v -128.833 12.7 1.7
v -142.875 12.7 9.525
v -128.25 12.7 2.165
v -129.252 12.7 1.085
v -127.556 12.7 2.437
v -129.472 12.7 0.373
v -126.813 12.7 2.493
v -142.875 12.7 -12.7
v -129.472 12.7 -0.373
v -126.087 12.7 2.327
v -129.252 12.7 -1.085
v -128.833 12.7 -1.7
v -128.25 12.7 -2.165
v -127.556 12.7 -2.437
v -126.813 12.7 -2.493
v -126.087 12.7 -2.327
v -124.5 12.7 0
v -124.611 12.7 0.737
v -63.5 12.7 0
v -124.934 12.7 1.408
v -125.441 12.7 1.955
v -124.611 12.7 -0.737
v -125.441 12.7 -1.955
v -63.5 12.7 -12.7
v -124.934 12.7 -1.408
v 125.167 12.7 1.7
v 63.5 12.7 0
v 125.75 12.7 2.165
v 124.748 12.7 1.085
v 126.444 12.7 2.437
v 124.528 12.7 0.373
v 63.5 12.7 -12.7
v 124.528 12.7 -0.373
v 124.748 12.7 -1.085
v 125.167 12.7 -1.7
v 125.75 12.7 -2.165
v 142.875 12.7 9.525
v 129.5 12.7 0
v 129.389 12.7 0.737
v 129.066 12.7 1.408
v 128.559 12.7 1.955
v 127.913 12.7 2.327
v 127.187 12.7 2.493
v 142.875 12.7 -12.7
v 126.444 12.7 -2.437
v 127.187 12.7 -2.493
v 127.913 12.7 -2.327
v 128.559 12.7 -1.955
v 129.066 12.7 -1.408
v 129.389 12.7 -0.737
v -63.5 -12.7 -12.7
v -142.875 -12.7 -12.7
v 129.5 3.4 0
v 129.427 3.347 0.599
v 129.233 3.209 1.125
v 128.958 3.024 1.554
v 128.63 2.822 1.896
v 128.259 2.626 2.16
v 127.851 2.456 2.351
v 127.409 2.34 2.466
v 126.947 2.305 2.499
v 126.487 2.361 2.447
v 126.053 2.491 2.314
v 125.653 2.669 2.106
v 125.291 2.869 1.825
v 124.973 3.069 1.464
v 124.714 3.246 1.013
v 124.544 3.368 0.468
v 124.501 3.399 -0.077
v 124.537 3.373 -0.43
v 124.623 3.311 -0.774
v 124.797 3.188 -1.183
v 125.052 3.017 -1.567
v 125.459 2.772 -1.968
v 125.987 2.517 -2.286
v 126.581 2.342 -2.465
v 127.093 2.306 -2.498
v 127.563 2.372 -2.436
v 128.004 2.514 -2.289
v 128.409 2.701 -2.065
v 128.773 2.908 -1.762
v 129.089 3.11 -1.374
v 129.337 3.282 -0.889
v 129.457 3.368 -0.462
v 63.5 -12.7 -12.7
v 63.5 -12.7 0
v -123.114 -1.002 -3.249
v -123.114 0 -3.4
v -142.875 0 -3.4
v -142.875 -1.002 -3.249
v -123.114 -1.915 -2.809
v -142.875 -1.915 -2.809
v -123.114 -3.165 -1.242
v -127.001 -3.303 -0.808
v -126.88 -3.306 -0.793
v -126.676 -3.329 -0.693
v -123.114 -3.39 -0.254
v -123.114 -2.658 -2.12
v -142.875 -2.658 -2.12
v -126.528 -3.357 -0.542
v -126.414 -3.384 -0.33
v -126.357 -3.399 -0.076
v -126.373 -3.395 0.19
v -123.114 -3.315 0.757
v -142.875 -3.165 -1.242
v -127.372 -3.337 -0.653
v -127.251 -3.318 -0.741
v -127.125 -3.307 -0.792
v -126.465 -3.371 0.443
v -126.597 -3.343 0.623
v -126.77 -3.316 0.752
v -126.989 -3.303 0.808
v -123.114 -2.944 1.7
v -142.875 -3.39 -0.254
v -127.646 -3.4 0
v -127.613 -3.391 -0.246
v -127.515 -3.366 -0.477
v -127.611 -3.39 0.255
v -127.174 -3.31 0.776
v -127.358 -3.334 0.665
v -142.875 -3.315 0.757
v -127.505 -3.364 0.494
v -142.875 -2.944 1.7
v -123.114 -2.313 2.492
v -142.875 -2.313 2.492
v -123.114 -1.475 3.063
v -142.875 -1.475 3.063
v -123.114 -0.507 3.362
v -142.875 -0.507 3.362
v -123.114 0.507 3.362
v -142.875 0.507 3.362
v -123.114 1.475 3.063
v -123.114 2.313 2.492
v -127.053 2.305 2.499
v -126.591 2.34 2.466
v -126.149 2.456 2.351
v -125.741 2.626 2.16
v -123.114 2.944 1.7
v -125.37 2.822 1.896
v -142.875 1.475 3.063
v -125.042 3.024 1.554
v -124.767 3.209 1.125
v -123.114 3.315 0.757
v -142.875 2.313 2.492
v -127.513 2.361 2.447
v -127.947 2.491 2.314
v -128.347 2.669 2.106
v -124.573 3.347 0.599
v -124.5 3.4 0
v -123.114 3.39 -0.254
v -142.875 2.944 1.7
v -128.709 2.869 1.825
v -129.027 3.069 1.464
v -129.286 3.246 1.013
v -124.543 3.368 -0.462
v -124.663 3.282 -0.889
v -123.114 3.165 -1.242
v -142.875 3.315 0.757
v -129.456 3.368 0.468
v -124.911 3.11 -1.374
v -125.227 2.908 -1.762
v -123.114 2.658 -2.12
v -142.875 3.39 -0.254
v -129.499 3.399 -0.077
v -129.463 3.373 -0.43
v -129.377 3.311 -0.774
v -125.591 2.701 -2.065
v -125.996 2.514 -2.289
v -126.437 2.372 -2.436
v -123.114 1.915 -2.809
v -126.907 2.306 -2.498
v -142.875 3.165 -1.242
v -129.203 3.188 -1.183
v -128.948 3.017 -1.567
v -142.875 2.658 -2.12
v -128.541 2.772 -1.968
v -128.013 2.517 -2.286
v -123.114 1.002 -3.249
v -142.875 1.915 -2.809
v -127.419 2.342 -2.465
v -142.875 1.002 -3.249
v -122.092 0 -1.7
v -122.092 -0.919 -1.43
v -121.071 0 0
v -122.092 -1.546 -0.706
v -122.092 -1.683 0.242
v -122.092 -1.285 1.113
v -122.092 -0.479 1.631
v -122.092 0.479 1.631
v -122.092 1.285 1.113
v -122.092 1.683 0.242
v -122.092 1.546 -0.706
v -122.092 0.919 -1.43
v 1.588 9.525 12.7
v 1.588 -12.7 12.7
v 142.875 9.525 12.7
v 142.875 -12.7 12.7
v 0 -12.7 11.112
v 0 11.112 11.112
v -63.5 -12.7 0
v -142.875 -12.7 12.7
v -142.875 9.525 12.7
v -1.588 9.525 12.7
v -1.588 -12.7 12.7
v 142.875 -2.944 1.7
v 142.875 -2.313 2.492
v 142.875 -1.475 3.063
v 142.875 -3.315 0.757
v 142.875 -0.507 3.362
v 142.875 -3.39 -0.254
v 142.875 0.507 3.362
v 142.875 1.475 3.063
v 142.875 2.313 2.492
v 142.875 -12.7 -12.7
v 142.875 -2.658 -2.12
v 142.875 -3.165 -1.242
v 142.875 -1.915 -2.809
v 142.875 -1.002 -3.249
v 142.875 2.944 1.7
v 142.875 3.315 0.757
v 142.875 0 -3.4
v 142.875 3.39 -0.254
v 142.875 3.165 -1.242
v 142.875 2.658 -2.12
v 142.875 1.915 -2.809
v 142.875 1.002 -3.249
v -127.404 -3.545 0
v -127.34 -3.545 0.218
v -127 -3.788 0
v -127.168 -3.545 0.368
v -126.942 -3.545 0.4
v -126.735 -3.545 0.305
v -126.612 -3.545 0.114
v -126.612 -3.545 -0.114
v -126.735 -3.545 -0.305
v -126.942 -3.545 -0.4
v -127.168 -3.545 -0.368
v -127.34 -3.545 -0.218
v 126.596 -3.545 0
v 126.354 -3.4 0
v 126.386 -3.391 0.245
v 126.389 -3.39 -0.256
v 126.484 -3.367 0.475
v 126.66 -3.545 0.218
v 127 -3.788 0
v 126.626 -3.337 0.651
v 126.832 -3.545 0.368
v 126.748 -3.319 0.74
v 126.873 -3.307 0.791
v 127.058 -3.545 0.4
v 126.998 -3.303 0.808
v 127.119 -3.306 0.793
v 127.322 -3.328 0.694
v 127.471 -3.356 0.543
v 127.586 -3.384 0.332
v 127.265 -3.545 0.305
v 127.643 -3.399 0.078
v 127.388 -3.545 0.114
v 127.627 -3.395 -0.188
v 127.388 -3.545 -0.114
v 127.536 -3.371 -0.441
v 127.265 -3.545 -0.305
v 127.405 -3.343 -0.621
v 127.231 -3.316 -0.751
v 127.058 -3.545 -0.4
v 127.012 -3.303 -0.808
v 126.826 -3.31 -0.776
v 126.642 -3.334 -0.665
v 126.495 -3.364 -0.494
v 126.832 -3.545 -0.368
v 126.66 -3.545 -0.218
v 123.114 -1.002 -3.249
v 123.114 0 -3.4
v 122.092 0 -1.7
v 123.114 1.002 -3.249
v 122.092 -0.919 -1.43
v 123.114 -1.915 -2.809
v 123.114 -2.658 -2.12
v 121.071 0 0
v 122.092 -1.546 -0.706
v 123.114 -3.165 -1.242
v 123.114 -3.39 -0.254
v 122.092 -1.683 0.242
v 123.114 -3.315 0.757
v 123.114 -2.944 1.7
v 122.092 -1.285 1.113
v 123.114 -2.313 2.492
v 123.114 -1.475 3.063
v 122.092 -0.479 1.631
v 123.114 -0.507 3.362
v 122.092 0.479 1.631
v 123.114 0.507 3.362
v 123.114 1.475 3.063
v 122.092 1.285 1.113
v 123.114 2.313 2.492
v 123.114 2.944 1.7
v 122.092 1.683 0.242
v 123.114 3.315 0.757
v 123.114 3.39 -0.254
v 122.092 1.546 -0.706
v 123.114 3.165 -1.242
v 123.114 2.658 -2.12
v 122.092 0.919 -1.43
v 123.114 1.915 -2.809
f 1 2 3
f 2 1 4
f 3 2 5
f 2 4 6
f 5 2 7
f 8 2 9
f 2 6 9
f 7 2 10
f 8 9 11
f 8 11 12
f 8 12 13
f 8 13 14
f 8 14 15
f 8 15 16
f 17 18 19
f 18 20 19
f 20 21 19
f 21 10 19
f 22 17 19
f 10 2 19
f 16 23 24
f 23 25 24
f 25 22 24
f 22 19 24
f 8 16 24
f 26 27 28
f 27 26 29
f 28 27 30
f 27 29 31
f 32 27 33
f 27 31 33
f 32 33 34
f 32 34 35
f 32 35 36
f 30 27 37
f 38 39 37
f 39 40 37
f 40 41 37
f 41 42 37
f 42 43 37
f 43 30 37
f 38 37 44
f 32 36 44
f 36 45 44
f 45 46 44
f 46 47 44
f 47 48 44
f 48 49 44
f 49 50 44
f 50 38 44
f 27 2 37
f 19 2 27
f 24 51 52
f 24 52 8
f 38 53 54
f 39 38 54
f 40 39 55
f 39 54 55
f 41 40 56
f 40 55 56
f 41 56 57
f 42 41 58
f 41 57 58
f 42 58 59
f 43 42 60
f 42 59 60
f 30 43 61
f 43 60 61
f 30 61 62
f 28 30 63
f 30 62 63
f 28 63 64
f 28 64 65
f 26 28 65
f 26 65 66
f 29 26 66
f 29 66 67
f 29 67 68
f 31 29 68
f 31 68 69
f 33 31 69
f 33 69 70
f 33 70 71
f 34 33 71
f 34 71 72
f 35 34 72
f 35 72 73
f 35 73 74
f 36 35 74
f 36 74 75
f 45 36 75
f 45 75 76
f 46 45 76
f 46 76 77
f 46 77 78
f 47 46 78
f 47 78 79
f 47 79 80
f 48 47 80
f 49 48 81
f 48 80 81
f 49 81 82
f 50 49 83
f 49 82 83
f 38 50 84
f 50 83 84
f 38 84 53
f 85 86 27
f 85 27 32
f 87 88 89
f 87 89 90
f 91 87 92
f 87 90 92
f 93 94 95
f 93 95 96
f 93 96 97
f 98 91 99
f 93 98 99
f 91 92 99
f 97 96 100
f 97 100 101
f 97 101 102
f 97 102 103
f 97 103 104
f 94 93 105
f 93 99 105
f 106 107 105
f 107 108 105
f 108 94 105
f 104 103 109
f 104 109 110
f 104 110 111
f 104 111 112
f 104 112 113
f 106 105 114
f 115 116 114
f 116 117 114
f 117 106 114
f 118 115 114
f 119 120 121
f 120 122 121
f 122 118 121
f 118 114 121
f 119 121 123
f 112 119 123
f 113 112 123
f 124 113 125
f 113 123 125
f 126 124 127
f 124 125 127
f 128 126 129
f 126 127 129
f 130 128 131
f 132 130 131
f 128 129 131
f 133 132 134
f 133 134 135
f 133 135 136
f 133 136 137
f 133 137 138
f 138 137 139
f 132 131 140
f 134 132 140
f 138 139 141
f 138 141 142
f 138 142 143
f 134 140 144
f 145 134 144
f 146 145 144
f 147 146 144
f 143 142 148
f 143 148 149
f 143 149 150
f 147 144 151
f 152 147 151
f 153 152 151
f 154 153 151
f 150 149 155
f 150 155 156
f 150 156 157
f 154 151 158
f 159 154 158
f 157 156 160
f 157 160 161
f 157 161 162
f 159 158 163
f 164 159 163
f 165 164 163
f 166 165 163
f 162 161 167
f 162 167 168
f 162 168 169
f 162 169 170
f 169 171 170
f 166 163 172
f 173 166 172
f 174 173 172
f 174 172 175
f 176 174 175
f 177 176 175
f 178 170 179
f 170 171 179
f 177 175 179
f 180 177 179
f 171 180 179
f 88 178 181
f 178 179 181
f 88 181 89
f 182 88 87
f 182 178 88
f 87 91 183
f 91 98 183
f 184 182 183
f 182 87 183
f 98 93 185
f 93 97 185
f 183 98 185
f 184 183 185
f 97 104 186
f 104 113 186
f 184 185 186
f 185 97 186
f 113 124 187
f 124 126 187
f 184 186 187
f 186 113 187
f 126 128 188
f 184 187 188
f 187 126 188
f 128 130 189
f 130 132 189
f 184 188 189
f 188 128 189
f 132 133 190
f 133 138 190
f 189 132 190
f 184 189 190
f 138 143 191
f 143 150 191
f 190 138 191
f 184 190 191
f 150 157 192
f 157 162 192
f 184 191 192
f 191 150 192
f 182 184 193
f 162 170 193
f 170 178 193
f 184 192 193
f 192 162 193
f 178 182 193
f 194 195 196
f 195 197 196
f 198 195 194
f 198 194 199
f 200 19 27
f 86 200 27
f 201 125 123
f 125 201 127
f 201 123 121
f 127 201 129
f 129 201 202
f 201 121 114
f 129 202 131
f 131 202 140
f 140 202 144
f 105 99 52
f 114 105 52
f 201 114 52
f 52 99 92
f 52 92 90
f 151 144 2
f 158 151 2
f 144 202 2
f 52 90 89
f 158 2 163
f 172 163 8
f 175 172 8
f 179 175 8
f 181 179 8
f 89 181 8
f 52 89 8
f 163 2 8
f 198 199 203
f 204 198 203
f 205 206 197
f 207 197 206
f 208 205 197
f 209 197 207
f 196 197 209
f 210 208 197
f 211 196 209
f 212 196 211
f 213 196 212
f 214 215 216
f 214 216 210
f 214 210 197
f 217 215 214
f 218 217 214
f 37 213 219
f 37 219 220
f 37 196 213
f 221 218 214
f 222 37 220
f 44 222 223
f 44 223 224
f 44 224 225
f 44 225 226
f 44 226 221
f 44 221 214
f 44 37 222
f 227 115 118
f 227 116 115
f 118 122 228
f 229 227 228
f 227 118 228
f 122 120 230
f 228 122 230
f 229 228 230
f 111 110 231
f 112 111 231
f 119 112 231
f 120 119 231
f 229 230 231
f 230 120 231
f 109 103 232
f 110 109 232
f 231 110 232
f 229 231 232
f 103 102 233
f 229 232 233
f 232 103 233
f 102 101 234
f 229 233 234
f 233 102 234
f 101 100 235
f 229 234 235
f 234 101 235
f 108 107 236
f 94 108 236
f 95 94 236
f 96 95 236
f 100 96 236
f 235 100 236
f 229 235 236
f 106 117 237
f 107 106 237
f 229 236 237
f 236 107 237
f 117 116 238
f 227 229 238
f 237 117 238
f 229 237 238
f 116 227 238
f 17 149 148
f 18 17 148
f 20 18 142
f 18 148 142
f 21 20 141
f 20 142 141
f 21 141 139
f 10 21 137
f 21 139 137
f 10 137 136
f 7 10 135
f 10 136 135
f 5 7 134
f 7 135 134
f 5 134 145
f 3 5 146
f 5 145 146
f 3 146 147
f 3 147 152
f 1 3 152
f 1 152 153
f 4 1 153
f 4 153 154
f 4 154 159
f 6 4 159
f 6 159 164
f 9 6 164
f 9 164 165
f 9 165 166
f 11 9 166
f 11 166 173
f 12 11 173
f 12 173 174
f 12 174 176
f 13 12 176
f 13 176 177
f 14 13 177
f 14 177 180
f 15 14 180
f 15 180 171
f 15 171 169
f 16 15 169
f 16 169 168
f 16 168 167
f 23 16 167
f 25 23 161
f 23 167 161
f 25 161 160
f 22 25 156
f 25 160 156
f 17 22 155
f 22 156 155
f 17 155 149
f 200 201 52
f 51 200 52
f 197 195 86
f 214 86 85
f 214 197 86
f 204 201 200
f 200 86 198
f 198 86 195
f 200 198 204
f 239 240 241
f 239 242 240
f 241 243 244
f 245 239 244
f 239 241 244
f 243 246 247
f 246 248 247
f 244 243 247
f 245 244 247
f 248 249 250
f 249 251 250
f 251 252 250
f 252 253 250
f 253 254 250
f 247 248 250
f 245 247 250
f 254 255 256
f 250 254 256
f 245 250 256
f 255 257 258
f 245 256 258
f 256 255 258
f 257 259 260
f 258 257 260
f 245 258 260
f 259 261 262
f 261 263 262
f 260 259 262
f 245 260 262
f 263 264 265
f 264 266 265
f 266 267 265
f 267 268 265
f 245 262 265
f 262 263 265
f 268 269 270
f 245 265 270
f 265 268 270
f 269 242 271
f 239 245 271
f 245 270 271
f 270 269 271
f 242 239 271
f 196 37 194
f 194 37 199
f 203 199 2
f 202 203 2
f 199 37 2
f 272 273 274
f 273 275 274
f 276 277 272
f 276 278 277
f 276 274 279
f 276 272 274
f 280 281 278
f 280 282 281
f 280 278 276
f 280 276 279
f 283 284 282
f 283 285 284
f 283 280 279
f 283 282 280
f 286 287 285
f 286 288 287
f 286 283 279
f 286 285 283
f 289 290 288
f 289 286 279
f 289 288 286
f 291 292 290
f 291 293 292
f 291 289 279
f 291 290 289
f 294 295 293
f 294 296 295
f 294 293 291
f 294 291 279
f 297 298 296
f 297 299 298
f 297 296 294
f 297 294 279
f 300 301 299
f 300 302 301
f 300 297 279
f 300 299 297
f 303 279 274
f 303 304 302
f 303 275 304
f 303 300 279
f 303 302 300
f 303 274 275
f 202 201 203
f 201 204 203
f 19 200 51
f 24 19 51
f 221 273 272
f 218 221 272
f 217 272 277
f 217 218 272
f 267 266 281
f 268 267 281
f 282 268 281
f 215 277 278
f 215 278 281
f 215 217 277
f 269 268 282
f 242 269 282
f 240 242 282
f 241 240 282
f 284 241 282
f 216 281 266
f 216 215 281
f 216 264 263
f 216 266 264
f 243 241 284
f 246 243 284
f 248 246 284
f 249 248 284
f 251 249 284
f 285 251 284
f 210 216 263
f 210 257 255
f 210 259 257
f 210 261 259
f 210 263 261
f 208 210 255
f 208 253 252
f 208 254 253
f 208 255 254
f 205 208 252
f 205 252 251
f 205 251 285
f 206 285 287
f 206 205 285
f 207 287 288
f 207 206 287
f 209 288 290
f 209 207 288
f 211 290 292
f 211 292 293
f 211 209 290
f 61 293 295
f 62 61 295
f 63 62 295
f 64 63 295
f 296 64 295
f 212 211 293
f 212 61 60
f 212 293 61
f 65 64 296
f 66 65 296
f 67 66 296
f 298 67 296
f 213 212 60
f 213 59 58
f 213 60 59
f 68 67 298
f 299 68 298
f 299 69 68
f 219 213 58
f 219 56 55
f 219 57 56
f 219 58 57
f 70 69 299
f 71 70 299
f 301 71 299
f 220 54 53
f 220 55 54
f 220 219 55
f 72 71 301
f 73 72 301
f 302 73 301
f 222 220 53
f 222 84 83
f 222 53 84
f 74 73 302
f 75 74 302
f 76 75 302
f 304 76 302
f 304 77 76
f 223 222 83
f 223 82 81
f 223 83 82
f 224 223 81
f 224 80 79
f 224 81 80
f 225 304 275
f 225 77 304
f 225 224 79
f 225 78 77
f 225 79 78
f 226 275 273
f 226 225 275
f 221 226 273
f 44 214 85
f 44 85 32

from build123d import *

# Parameters (mm, degrees)
SKETCH1_W                 = 25.4
SKETCH1_H                 = 25.4
EXTRUDE1_DEPTH            = 142.875
CHAMFER1_SIZE             = 3.175
M6X1_0_TAPPED_HOLE1_D     = 5
M6X1_0_TAPPED_HOLE1_DEPTH = 14.986
M6X1_0_TAPPED_HOLE1_TIP   = 1.502151548
CUT_EXTRUDE1_REACH        = 27.4
SKETCH10_W                = 127
SKETCH10_H                = 12.7
CUT_EXTRUDE2_REACH        = 27.4


with BuildPart() as part:
    # Sketch1 → Extrude1 (new body, symmetric)
    with BuildSketch(Plane(origin=(0, 0, 0), x_dir=(0, 0, -1), z_dir=(1, 0, 0))):
        Rectangle(SKETCH1_W, SKETCH1_H)
    extrude(amount=EXTRUDE1_DEPTH, both=True)

    # Sketch2 → M8x1.25 Tapped Hole1 (revolve, cut)
    with BuildSketch(Plane(origin=(142.875, 0, 0), x_dir=(0, 0, -1), z_dir=(0, 1, 0))):
        Polygon((0, 0), (0, 21.804126105), (3.4, 19.7612), (3.4, 0), align=None)
    m8x1_25_tapped_hole1 = revolve(axis=Axis((149.225, 0, 0), (-1, 0, 0)), mode=Mode.SUBTRACT)

    # Mirror1: M8x1.25 Tapped Hole1 across plane
    add(m8x1_25_tapped_hole1.mirror(Plane(origin=(0, 0, 0), x_dir=(0, 0, 1), z_dir=(1, 0, 0))), mode=Mode.SUBTRACT)

    # Chamfer1
    chamfer1_edges = [part.edges().sort_by_distance(p)[0] for p in [
        (0, 12.7, 12.7),
    ]]
    chamfer(chamfer1_edges, length=CHAMFER1_SIZE)

    # M6x1.0 Tapped Hole1
    with Locations(Plane(origin=(0, 12.7, 0), x_dir=(-1, 0, 0), z_dir=(0, 1, 0))):
        with Locations((127, 0), (-127, 0)):
            Hole(M6X1_0_TAPPED_HOLE1_D / 2, depth=M6X1_0_TAPPED_HOLE1_DEPTH)
            with Locations((0, 0, -(M6X1_0_TAPPED_HOLE1_DEPTH + M6X1_0_TAPPED_HOLE1_TIP / 2))):  # 118° drill point
                Cone(0, M6X1_0_TAPPED_HOLE1_D / 2, M6X1_0_TAPPED_HOLE1_TIP, mode=Mode.SUBTRACT)

    # Sketch10 → Cut-Extrude1 (cut, up to next)
    with BuildSketch(Plane(origin=(0, 12.7, 0), x_dir=(1, 0, 0), z_dir=(0, 1, 0)), mode=Mode.PRIVATE) as cut_extrude1_sk1:
        with Locations((0, 6.35)):
            Rectangle(SKETCH10_W, SKETCH10_H)
    cut_extrude1_tool1 = extrude(cut_extrude1_sk1.sketch, amount=-CUT_EXTRUDE1_REACH, mode=Mode.PRIVATE) & part.part
    add(cut_extrude1_tool1.solids().sort_by_distance((0, 12.7, -6.35))[0], mode=Mode.SUBTRACT)

    # Sketch11 → Cut-Extrude2 (cut, up to next)
    with BuildSketch(Plane.XZ.offset(12.7), mode=Mode.PRIVATE) as cut_extrude2_sk1:
        Polygon((-1.5875, 12.7), (1.5875, 12.7), (0, 11.1125), align=None)
    cut_extrude2_tool1 = extrude(cut_extrude2_sk1.sketch, amount=-CUT_EXTRUDE2_REACH, mode=Mode.PRIVATE) & part.part
    add(cut_extrude2_tool1.solids().sort_by_distance((0, -12.7, 12.170833))[0], mode=Mode.SUBTRACT)


solid = part.part
